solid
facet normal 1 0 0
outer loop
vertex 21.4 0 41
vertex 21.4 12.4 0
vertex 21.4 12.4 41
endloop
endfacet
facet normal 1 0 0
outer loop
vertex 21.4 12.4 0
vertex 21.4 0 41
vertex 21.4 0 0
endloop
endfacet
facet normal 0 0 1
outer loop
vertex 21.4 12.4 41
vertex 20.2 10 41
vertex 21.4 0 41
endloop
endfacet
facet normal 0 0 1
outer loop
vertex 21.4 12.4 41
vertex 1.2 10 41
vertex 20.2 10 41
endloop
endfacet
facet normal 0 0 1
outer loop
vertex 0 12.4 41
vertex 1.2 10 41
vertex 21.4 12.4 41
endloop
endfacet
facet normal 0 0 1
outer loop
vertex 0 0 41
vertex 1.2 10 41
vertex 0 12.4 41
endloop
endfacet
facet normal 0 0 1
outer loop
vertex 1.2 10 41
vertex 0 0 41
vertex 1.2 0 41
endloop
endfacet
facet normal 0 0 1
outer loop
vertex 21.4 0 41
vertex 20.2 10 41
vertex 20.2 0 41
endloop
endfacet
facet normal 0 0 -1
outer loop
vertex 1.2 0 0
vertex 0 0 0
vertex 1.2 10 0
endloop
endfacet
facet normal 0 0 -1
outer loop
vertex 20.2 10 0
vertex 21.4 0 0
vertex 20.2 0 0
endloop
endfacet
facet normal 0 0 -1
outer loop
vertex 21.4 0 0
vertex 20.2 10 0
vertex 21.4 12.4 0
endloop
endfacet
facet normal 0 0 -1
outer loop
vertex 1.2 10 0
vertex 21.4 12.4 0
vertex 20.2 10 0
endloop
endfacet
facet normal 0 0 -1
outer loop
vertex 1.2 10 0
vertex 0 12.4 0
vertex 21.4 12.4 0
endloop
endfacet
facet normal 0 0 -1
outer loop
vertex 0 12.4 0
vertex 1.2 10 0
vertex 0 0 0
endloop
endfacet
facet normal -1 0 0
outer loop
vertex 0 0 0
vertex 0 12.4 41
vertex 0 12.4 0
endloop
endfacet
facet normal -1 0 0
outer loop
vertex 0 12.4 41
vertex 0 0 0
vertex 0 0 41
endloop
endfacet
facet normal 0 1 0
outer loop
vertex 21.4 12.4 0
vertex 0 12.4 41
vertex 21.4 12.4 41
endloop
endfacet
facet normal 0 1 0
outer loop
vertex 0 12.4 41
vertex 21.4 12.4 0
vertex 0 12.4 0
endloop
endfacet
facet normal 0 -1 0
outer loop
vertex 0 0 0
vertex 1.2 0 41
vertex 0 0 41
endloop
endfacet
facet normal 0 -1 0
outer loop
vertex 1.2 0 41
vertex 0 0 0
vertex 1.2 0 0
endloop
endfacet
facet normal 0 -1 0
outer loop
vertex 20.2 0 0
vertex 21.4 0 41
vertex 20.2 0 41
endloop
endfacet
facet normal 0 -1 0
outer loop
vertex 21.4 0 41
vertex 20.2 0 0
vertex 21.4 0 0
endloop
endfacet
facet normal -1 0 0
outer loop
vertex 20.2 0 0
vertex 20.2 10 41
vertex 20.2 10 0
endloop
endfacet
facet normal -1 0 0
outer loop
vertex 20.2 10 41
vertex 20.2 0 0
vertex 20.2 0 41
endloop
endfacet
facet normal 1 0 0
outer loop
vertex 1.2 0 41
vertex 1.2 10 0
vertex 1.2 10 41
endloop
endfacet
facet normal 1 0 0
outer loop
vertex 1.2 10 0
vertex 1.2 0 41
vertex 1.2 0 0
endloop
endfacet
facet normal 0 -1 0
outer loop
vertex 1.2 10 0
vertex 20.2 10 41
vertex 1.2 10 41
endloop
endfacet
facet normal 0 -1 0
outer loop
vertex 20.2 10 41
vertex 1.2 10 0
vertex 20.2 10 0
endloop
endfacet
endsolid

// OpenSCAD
width=19;
depth=10;
wall_thickness=1.2;
length1=119;
length2=200;
length3=41;


module right_angle_cubes(width, depth, l1, l2) {
  cube([width, depth, l1], center=false);
  translate([0, 0,width]) {rotate([0, 90, 0]) {cube([width, depth, l2], center=false);}}
}



module right_angle_bracket_left() {
difference() {
right_angle_cubes(width+2*wall_thickness, depth+2*wall_thickness, length1+wall_thickness, length2+wall_thickness);
translate([wall_thickness, 0, wall_thickness]) {right_angle_cubes(width, depth, length1, length2);}
}
}

module right_angle_bracket_right() {
mirror() { right_angle_bracket_left(); }
}


module straight(width, depth, l1) {
difference() {
 cube([width+2*wall_thickness, depth+2*wall_thickness, l1], center=false);
 translate([wall_thickness, 0, 0]) { cube([width, depth, l1], center=false);}
}
}


//right_angle_bracket_right();
//translate([width+2*wall_thickness+2, 0, length1+width+3*wall_thickness+2]) { rotate([0, 180, 0]) { right_angle_bracket_left(); }}

straight(width, depth, length3);
